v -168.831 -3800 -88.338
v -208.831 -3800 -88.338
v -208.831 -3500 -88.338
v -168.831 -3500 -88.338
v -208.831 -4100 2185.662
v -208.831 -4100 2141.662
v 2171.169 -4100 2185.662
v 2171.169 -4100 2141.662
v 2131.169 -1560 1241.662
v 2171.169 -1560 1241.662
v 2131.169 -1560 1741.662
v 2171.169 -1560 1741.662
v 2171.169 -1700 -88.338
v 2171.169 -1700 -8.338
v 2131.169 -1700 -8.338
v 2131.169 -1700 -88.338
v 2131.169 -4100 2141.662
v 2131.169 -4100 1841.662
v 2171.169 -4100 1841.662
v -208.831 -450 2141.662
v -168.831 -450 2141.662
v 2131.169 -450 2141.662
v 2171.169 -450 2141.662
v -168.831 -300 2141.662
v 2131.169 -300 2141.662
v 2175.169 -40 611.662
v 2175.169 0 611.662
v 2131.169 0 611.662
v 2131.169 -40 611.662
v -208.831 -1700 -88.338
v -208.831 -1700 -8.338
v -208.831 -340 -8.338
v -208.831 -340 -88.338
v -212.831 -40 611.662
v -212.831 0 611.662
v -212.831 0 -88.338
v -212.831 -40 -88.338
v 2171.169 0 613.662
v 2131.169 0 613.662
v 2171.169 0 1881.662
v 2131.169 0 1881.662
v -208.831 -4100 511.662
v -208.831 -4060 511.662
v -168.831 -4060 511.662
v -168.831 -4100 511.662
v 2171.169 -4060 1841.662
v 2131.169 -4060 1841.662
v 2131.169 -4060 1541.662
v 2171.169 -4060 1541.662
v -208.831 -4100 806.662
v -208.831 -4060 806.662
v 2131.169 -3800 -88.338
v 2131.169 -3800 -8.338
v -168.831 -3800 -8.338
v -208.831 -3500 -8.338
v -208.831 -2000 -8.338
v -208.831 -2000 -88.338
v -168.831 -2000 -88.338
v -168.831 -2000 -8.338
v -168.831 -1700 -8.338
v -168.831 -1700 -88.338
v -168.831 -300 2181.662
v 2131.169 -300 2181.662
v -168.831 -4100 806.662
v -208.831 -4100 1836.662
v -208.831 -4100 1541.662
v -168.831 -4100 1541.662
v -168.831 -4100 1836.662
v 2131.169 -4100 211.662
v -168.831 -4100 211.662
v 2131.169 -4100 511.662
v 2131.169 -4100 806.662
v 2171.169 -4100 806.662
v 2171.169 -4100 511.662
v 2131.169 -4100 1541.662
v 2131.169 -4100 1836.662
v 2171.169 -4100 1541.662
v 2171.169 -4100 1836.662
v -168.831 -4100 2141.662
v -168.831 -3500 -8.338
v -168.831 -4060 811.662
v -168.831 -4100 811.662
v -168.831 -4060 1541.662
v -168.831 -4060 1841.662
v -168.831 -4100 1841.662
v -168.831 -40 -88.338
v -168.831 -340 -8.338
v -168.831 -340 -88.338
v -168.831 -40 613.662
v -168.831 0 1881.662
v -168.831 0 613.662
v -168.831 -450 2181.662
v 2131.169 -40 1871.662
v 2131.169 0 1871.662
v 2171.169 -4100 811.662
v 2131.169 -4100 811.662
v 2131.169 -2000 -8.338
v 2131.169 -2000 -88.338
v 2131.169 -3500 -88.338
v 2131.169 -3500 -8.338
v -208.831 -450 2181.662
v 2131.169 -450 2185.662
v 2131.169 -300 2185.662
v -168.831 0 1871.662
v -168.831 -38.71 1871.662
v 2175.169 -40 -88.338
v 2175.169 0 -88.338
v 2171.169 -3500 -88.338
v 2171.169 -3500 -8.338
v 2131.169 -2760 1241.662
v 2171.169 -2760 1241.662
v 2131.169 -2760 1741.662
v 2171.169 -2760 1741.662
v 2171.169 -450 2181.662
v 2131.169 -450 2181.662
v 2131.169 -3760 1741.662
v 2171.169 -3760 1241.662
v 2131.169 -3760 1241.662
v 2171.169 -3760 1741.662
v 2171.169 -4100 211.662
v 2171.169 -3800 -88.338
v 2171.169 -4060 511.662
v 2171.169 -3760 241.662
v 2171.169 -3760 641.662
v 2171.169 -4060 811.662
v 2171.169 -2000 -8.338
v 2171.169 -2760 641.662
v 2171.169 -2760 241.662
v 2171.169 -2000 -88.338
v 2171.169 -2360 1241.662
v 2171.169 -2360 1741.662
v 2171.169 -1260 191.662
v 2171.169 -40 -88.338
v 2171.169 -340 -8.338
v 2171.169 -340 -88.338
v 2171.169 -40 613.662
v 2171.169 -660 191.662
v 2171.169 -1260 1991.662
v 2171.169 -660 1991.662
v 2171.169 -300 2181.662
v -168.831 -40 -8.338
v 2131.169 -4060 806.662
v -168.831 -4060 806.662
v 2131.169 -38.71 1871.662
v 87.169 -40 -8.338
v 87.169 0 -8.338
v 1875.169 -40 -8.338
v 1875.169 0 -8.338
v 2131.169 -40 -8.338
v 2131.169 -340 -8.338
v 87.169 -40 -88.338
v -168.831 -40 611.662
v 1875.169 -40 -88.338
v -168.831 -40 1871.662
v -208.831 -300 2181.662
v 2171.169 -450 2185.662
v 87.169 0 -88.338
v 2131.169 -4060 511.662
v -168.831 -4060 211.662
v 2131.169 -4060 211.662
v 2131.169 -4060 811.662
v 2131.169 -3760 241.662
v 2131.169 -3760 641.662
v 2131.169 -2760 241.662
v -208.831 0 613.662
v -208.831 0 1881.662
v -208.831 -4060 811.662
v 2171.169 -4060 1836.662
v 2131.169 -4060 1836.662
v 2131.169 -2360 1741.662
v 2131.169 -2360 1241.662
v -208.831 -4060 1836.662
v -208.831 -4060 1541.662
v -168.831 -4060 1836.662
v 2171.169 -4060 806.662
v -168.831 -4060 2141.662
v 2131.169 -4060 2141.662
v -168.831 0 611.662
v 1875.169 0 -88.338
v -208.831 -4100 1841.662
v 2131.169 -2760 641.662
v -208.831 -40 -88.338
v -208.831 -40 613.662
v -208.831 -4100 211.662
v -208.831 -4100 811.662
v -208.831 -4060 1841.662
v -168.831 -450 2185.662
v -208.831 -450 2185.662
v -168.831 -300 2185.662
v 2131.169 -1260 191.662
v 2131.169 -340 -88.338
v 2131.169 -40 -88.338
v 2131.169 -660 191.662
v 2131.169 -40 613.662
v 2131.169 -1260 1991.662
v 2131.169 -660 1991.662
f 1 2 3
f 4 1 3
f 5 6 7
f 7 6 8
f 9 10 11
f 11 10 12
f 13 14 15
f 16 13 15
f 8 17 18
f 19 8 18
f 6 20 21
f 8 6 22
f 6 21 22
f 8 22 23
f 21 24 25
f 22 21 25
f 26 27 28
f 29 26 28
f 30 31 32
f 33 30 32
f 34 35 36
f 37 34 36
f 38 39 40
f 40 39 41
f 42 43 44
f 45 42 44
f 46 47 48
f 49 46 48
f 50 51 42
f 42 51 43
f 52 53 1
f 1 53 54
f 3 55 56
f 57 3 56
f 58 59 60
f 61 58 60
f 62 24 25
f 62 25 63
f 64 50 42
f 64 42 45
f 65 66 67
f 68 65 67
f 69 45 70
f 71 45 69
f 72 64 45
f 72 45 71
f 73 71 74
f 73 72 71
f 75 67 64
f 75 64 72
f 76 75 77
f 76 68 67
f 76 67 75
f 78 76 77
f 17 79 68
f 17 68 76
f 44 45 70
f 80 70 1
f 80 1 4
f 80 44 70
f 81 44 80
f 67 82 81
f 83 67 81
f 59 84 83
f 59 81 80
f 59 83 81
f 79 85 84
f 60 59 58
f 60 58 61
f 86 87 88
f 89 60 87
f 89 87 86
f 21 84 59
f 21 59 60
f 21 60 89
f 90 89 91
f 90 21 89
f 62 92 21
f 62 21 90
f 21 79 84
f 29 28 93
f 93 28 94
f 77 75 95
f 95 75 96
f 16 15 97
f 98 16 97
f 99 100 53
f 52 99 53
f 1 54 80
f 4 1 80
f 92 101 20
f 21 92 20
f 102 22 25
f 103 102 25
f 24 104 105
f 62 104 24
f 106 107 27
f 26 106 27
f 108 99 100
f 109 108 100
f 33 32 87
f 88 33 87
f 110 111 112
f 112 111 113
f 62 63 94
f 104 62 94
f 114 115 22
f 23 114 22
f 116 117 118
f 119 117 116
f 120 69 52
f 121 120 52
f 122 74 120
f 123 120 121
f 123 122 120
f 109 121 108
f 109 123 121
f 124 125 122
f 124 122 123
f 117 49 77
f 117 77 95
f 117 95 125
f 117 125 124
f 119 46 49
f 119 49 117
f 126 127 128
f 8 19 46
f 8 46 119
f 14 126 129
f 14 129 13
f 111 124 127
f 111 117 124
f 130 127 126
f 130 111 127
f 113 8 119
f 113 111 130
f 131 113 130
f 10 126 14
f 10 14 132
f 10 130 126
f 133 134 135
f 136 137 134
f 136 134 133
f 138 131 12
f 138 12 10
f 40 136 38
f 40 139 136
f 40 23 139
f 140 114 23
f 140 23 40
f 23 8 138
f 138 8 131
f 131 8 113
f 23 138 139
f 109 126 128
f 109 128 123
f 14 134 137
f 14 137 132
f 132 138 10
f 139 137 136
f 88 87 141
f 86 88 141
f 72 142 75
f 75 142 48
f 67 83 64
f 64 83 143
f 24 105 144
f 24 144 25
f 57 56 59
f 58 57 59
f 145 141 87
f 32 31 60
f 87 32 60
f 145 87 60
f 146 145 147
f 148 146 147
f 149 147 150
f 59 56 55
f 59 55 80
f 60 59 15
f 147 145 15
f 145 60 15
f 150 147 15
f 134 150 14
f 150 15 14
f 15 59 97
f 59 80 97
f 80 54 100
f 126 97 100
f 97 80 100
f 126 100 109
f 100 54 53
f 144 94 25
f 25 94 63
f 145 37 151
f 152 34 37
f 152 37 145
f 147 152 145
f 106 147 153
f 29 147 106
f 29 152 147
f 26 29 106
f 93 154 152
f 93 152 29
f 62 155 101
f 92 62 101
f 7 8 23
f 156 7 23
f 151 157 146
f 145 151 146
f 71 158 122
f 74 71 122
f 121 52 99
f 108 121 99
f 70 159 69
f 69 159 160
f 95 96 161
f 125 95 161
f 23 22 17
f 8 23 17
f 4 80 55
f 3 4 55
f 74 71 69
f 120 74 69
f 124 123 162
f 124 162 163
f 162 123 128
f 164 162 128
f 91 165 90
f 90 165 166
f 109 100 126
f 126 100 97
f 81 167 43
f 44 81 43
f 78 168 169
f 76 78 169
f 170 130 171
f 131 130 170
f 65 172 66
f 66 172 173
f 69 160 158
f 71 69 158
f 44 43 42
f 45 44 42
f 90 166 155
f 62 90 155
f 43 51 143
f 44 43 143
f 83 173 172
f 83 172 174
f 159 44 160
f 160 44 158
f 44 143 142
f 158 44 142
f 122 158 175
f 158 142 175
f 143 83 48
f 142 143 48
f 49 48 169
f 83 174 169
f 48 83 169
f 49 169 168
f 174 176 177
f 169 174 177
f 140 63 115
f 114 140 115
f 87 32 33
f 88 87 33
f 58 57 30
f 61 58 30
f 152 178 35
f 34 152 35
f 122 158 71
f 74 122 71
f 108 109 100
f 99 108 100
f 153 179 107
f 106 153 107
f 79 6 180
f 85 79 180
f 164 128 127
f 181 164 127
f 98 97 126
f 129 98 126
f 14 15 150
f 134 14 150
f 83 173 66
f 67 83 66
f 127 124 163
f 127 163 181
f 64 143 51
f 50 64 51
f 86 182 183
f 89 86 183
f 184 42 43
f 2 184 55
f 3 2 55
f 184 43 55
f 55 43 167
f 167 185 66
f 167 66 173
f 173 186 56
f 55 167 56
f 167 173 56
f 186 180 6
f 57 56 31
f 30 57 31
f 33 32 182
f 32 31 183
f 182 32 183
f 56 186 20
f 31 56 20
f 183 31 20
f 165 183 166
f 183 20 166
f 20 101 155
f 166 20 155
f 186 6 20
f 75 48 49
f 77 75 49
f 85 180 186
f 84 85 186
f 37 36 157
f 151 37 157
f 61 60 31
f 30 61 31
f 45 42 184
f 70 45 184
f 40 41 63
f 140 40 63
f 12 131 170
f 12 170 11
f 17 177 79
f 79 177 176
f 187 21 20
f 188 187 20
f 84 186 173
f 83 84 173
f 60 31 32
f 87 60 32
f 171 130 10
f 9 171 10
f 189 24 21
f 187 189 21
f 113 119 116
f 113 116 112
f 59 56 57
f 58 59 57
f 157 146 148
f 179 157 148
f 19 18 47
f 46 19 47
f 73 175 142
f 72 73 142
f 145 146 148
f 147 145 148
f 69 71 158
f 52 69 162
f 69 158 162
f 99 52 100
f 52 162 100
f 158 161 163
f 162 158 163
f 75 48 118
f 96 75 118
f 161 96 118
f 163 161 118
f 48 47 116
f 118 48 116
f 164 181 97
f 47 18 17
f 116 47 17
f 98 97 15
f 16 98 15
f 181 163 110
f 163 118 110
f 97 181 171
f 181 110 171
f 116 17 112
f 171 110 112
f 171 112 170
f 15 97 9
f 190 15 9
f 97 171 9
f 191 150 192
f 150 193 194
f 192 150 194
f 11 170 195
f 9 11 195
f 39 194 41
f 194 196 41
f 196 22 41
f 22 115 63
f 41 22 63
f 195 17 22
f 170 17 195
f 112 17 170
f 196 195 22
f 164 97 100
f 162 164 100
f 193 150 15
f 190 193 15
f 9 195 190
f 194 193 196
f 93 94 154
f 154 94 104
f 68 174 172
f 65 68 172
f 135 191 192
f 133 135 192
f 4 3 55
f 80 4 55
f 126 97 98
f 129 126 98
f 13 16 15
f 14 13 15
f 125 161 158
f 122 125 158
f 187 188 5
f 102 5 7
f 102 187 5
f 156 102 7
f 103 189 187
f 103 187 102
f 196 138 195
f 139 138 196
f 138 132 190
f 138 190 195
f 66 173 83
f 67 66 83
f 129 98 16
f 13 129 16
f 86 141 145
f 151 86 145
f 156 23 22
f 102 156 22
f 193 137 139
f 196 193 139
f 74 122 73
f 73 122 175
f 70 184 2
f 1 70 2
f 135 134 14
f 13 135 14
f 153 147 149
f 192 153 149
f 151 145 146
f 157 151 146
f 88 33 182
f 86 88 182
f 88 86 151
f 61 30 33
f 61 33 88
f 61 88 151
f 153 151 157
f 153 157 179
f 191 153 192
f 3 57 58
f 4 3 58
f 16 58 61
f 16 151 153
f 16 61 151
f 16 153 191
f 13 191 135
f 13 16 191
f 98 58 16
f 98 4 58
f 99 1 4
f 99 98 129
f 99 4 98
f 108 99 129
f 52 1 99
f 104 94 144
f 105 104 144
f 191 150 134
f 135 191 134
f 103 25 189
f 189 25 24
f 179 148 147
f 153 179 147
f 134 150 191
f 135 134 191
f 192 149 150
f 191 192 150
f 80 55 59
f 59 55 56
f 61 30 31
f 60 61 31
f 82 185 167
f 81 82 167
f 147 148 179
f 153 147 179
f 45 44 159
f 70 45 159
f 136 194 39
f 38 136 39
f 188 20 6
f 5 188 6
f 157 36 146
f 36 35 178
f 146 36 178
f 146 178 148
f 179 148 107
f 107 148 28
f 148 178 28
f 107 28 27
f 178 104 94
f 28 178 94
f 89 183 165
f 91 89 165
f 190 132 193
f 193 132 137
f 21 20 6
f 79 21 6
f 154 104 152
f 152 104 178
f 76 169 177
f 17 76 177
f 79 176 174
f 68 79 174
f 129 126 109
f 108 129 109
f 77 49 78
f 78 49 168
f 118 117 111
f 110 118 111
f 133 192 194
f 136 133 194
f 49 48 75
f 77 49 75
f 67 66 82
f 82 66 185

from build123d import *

# Parameters (mm, degrees)
F1_DEPTH  = 40
F3_DEPTH  = 40
F6_DEPTH  = 40
F8_DEPTH  = 44
F10_DEPTH = 2300
F12_DEPTH = 80
F13_W     = 1000
F13_H     = 500
F13_W_2   = 800
F13_W_3   = 600
F13_H_2   = 1800
F13_H_3   = 400
F14_DEPTH = 40


with BuildPart() as f1:
    # F0 (on Front) → F1 (new body)
    with BuildSketch(Plane.XZ):
        Polygon((1875.1689910889, -88.3379688097), (2175.1689910889, -88.3379688097), (2175.1689910889, 611.6620311903), (2131.1689910889, 611.6620311903), (2131.1689910889, 1871.6620311903), (-168.8310089111, 1871.6620311903), (-168.8310089111, 611.6620311903), (-212.8310089111, 611.6620311903), (-212.8310089111, -88.3379688097), (87.1689910889, -88.3379688097), (87.1689910889, -8.3379688097), (1875.1689910889, -8.3379688097), align=None)
    extrude(amount=F1_DEPTH)


with BuildPart() as f3:
    # F2 (on face) → F3 (new body)
    with BuildSketch(Plane.YZ.offset(2131.1689910889)):
        Polygon((-340, -88.3379688097), (-40, -88.3379688097), (-40, 613.6620311903), (0, 613.6620311903), (0, 1881.6620311903), (-300, 2181.6620311903), (-450, 2181.6620311903), (-450, 2141.6620311903), (-4100, 2141.6620311903), (-4100, 1841.6620311903), (-4060, 1841.6620311903), (-4060, 1541.6620311903), (-4100, 1541.6620311903), (-4100, 811.6620311903), (-4060, 811.6620311903), (-4060, 511.6620311903), (-4100, 511.6620311903), (-4100, 211.6620311903), (-3800, -88.3379688097), (-3500, -88.3379688097), (-3500, -8.3379688097), (-2000, -8.3379688097), (-2000, -88.3379688097), (-1700, -88.3379688097), (-1700, -8.3379688097), (-340, -8.3379688097), align=None)
    extrude(amount=F3_DEPTH)


with BuildPart() as f4_1:
    # F4: copy of F3
    add(f3.part.moved(Location((-2340, 0, 0))))


with BuildPart() as f6:
    # F5 (on face) → F6 (new body)
    with BuildSketch(Plane.XZ.offset(4060)):
        Polygon((2171.1689910889, 1541.6620311903), (2171.1689910889, 1836.6620311903), (2131.1689910889, 1836.6620311903), (2131.1689910889, 2141.6620311903), (-168.8310089111, 2141.6620311903), (-168.8310089111, 1836.6620311903), (-208.8310089111, 1836.6620311903), (-208.8310089111, 1541.6620311903), (-168.8310089111, 1541.6620311903), (-168.8310089111, 806.6620311903), (-208.8310089111, 806.6620311903), (-208.8310089111, 511.6620311903), (-168.8310089111, 511.6620311903), (-168.8310089111, 211.6620311903), (2131.1689910889, 211.6620311903), (2131.1689910889, 511.6620311903), (2171.1689910889, 511.6620311903), (2171.1689910889, 806.6620311903), (2131.1689910889, 806.6620311903), (2131.1689910889, 1541.6620311903), align=None)
    extrude(amount=F6_DEPTH)


with BuildPart() as f8:
    # F7 (on face) → F8 (new body)
    with BuildSketch(Plane.XY.offset(2141.6620311903)):
        Polygon((-208.8310089111, -450), (-208.8310089111, -4100), (2171.1689910889, -4100), (2171.1689910889, -450), (2131.1689910889, -450), (2131.1689910889, -300), (-168.8310089111, -300), (-168.8310089111, -450), align=None)
    extrude(amount=F8_DEPTH)


with BuildPart() as f10:
    # F9 (on face) → F10 (new body, through all)
    with BuildSketch(Plane(origin=(2131.1689910889, 0, 0), x_dir=(0, -1, 0), z_dir=(-1, 0, 0))):
        Polygon((300, 2141.6620311903), (300, 2181.6620311903), (0, 1871.6620311903), (38.7096774194, 1871.6620311903), align=None)
    extrude(amount=F10_DEPTH)


with BuildPart() as f12:
    # F11 (on face) → F12 (new body)
    with BuildSketch(Plane(origin=(0, 0, -8.3379688097), x_dir=(1, 0, 0), z_dir=(0, 0, -1))):
        Polygon((2131.1689910889, 3500), (2131.1689910889, 3800), (-168.8310089111, 3800), (-168.8310089111, 3500), (-208.8310089111, 3500), (-208.8310089111, 2000), (-168.8310089111, 2000), (-168.8310089111, 1700), (-208.8310089111, 1700), (-208.8310089111, 340), (-168.8310089111, 340), (-168.8310089111, 40), (87.1689910889, 40), (87.1689910889, 0), (1875.1689910889, 0), (1875.1689910889, 40), (2131.1689910889, 40), (2131.1689910889, 340), (2171.1689910889, 340), (2171.1689910889, 1700), (2131.1689910889, 1700), (2131.1689910889, 2000), (2171.1689910889, 2000), (2171.1689910889, 3500), align=None)
    extrude(amount=F12_DEPTH)


with BuildPart() as f3_1:
    add(f3.part)

    # F13 (on face) → F14 (cut, through all)
    with BuildSketch(Plane.YZ.offset(2171.1689910889)):
        with Locations((-3260, 1491.6620311903)):
            Rectangle(F13_W, F13_H)
        with Locations((-1960, 1491.6620311903)):
            Rectangle(F13_W_2, F13_H)
        with Locations((-960, 1091.6620311903)):
            Rectangle(F13_W_3, F13_H_2)
        with Locations((-3260, 441.6620311903)):
            Rectangle(F13_W, F13_H_3)
    extrude(amount=-F14_DEPTH, mode=Mode.SUBTRACT)


solid = Compound([f1.part, f4_1.part, f6.part, f8.part, f10.part, f12.part, f3_1.part])
